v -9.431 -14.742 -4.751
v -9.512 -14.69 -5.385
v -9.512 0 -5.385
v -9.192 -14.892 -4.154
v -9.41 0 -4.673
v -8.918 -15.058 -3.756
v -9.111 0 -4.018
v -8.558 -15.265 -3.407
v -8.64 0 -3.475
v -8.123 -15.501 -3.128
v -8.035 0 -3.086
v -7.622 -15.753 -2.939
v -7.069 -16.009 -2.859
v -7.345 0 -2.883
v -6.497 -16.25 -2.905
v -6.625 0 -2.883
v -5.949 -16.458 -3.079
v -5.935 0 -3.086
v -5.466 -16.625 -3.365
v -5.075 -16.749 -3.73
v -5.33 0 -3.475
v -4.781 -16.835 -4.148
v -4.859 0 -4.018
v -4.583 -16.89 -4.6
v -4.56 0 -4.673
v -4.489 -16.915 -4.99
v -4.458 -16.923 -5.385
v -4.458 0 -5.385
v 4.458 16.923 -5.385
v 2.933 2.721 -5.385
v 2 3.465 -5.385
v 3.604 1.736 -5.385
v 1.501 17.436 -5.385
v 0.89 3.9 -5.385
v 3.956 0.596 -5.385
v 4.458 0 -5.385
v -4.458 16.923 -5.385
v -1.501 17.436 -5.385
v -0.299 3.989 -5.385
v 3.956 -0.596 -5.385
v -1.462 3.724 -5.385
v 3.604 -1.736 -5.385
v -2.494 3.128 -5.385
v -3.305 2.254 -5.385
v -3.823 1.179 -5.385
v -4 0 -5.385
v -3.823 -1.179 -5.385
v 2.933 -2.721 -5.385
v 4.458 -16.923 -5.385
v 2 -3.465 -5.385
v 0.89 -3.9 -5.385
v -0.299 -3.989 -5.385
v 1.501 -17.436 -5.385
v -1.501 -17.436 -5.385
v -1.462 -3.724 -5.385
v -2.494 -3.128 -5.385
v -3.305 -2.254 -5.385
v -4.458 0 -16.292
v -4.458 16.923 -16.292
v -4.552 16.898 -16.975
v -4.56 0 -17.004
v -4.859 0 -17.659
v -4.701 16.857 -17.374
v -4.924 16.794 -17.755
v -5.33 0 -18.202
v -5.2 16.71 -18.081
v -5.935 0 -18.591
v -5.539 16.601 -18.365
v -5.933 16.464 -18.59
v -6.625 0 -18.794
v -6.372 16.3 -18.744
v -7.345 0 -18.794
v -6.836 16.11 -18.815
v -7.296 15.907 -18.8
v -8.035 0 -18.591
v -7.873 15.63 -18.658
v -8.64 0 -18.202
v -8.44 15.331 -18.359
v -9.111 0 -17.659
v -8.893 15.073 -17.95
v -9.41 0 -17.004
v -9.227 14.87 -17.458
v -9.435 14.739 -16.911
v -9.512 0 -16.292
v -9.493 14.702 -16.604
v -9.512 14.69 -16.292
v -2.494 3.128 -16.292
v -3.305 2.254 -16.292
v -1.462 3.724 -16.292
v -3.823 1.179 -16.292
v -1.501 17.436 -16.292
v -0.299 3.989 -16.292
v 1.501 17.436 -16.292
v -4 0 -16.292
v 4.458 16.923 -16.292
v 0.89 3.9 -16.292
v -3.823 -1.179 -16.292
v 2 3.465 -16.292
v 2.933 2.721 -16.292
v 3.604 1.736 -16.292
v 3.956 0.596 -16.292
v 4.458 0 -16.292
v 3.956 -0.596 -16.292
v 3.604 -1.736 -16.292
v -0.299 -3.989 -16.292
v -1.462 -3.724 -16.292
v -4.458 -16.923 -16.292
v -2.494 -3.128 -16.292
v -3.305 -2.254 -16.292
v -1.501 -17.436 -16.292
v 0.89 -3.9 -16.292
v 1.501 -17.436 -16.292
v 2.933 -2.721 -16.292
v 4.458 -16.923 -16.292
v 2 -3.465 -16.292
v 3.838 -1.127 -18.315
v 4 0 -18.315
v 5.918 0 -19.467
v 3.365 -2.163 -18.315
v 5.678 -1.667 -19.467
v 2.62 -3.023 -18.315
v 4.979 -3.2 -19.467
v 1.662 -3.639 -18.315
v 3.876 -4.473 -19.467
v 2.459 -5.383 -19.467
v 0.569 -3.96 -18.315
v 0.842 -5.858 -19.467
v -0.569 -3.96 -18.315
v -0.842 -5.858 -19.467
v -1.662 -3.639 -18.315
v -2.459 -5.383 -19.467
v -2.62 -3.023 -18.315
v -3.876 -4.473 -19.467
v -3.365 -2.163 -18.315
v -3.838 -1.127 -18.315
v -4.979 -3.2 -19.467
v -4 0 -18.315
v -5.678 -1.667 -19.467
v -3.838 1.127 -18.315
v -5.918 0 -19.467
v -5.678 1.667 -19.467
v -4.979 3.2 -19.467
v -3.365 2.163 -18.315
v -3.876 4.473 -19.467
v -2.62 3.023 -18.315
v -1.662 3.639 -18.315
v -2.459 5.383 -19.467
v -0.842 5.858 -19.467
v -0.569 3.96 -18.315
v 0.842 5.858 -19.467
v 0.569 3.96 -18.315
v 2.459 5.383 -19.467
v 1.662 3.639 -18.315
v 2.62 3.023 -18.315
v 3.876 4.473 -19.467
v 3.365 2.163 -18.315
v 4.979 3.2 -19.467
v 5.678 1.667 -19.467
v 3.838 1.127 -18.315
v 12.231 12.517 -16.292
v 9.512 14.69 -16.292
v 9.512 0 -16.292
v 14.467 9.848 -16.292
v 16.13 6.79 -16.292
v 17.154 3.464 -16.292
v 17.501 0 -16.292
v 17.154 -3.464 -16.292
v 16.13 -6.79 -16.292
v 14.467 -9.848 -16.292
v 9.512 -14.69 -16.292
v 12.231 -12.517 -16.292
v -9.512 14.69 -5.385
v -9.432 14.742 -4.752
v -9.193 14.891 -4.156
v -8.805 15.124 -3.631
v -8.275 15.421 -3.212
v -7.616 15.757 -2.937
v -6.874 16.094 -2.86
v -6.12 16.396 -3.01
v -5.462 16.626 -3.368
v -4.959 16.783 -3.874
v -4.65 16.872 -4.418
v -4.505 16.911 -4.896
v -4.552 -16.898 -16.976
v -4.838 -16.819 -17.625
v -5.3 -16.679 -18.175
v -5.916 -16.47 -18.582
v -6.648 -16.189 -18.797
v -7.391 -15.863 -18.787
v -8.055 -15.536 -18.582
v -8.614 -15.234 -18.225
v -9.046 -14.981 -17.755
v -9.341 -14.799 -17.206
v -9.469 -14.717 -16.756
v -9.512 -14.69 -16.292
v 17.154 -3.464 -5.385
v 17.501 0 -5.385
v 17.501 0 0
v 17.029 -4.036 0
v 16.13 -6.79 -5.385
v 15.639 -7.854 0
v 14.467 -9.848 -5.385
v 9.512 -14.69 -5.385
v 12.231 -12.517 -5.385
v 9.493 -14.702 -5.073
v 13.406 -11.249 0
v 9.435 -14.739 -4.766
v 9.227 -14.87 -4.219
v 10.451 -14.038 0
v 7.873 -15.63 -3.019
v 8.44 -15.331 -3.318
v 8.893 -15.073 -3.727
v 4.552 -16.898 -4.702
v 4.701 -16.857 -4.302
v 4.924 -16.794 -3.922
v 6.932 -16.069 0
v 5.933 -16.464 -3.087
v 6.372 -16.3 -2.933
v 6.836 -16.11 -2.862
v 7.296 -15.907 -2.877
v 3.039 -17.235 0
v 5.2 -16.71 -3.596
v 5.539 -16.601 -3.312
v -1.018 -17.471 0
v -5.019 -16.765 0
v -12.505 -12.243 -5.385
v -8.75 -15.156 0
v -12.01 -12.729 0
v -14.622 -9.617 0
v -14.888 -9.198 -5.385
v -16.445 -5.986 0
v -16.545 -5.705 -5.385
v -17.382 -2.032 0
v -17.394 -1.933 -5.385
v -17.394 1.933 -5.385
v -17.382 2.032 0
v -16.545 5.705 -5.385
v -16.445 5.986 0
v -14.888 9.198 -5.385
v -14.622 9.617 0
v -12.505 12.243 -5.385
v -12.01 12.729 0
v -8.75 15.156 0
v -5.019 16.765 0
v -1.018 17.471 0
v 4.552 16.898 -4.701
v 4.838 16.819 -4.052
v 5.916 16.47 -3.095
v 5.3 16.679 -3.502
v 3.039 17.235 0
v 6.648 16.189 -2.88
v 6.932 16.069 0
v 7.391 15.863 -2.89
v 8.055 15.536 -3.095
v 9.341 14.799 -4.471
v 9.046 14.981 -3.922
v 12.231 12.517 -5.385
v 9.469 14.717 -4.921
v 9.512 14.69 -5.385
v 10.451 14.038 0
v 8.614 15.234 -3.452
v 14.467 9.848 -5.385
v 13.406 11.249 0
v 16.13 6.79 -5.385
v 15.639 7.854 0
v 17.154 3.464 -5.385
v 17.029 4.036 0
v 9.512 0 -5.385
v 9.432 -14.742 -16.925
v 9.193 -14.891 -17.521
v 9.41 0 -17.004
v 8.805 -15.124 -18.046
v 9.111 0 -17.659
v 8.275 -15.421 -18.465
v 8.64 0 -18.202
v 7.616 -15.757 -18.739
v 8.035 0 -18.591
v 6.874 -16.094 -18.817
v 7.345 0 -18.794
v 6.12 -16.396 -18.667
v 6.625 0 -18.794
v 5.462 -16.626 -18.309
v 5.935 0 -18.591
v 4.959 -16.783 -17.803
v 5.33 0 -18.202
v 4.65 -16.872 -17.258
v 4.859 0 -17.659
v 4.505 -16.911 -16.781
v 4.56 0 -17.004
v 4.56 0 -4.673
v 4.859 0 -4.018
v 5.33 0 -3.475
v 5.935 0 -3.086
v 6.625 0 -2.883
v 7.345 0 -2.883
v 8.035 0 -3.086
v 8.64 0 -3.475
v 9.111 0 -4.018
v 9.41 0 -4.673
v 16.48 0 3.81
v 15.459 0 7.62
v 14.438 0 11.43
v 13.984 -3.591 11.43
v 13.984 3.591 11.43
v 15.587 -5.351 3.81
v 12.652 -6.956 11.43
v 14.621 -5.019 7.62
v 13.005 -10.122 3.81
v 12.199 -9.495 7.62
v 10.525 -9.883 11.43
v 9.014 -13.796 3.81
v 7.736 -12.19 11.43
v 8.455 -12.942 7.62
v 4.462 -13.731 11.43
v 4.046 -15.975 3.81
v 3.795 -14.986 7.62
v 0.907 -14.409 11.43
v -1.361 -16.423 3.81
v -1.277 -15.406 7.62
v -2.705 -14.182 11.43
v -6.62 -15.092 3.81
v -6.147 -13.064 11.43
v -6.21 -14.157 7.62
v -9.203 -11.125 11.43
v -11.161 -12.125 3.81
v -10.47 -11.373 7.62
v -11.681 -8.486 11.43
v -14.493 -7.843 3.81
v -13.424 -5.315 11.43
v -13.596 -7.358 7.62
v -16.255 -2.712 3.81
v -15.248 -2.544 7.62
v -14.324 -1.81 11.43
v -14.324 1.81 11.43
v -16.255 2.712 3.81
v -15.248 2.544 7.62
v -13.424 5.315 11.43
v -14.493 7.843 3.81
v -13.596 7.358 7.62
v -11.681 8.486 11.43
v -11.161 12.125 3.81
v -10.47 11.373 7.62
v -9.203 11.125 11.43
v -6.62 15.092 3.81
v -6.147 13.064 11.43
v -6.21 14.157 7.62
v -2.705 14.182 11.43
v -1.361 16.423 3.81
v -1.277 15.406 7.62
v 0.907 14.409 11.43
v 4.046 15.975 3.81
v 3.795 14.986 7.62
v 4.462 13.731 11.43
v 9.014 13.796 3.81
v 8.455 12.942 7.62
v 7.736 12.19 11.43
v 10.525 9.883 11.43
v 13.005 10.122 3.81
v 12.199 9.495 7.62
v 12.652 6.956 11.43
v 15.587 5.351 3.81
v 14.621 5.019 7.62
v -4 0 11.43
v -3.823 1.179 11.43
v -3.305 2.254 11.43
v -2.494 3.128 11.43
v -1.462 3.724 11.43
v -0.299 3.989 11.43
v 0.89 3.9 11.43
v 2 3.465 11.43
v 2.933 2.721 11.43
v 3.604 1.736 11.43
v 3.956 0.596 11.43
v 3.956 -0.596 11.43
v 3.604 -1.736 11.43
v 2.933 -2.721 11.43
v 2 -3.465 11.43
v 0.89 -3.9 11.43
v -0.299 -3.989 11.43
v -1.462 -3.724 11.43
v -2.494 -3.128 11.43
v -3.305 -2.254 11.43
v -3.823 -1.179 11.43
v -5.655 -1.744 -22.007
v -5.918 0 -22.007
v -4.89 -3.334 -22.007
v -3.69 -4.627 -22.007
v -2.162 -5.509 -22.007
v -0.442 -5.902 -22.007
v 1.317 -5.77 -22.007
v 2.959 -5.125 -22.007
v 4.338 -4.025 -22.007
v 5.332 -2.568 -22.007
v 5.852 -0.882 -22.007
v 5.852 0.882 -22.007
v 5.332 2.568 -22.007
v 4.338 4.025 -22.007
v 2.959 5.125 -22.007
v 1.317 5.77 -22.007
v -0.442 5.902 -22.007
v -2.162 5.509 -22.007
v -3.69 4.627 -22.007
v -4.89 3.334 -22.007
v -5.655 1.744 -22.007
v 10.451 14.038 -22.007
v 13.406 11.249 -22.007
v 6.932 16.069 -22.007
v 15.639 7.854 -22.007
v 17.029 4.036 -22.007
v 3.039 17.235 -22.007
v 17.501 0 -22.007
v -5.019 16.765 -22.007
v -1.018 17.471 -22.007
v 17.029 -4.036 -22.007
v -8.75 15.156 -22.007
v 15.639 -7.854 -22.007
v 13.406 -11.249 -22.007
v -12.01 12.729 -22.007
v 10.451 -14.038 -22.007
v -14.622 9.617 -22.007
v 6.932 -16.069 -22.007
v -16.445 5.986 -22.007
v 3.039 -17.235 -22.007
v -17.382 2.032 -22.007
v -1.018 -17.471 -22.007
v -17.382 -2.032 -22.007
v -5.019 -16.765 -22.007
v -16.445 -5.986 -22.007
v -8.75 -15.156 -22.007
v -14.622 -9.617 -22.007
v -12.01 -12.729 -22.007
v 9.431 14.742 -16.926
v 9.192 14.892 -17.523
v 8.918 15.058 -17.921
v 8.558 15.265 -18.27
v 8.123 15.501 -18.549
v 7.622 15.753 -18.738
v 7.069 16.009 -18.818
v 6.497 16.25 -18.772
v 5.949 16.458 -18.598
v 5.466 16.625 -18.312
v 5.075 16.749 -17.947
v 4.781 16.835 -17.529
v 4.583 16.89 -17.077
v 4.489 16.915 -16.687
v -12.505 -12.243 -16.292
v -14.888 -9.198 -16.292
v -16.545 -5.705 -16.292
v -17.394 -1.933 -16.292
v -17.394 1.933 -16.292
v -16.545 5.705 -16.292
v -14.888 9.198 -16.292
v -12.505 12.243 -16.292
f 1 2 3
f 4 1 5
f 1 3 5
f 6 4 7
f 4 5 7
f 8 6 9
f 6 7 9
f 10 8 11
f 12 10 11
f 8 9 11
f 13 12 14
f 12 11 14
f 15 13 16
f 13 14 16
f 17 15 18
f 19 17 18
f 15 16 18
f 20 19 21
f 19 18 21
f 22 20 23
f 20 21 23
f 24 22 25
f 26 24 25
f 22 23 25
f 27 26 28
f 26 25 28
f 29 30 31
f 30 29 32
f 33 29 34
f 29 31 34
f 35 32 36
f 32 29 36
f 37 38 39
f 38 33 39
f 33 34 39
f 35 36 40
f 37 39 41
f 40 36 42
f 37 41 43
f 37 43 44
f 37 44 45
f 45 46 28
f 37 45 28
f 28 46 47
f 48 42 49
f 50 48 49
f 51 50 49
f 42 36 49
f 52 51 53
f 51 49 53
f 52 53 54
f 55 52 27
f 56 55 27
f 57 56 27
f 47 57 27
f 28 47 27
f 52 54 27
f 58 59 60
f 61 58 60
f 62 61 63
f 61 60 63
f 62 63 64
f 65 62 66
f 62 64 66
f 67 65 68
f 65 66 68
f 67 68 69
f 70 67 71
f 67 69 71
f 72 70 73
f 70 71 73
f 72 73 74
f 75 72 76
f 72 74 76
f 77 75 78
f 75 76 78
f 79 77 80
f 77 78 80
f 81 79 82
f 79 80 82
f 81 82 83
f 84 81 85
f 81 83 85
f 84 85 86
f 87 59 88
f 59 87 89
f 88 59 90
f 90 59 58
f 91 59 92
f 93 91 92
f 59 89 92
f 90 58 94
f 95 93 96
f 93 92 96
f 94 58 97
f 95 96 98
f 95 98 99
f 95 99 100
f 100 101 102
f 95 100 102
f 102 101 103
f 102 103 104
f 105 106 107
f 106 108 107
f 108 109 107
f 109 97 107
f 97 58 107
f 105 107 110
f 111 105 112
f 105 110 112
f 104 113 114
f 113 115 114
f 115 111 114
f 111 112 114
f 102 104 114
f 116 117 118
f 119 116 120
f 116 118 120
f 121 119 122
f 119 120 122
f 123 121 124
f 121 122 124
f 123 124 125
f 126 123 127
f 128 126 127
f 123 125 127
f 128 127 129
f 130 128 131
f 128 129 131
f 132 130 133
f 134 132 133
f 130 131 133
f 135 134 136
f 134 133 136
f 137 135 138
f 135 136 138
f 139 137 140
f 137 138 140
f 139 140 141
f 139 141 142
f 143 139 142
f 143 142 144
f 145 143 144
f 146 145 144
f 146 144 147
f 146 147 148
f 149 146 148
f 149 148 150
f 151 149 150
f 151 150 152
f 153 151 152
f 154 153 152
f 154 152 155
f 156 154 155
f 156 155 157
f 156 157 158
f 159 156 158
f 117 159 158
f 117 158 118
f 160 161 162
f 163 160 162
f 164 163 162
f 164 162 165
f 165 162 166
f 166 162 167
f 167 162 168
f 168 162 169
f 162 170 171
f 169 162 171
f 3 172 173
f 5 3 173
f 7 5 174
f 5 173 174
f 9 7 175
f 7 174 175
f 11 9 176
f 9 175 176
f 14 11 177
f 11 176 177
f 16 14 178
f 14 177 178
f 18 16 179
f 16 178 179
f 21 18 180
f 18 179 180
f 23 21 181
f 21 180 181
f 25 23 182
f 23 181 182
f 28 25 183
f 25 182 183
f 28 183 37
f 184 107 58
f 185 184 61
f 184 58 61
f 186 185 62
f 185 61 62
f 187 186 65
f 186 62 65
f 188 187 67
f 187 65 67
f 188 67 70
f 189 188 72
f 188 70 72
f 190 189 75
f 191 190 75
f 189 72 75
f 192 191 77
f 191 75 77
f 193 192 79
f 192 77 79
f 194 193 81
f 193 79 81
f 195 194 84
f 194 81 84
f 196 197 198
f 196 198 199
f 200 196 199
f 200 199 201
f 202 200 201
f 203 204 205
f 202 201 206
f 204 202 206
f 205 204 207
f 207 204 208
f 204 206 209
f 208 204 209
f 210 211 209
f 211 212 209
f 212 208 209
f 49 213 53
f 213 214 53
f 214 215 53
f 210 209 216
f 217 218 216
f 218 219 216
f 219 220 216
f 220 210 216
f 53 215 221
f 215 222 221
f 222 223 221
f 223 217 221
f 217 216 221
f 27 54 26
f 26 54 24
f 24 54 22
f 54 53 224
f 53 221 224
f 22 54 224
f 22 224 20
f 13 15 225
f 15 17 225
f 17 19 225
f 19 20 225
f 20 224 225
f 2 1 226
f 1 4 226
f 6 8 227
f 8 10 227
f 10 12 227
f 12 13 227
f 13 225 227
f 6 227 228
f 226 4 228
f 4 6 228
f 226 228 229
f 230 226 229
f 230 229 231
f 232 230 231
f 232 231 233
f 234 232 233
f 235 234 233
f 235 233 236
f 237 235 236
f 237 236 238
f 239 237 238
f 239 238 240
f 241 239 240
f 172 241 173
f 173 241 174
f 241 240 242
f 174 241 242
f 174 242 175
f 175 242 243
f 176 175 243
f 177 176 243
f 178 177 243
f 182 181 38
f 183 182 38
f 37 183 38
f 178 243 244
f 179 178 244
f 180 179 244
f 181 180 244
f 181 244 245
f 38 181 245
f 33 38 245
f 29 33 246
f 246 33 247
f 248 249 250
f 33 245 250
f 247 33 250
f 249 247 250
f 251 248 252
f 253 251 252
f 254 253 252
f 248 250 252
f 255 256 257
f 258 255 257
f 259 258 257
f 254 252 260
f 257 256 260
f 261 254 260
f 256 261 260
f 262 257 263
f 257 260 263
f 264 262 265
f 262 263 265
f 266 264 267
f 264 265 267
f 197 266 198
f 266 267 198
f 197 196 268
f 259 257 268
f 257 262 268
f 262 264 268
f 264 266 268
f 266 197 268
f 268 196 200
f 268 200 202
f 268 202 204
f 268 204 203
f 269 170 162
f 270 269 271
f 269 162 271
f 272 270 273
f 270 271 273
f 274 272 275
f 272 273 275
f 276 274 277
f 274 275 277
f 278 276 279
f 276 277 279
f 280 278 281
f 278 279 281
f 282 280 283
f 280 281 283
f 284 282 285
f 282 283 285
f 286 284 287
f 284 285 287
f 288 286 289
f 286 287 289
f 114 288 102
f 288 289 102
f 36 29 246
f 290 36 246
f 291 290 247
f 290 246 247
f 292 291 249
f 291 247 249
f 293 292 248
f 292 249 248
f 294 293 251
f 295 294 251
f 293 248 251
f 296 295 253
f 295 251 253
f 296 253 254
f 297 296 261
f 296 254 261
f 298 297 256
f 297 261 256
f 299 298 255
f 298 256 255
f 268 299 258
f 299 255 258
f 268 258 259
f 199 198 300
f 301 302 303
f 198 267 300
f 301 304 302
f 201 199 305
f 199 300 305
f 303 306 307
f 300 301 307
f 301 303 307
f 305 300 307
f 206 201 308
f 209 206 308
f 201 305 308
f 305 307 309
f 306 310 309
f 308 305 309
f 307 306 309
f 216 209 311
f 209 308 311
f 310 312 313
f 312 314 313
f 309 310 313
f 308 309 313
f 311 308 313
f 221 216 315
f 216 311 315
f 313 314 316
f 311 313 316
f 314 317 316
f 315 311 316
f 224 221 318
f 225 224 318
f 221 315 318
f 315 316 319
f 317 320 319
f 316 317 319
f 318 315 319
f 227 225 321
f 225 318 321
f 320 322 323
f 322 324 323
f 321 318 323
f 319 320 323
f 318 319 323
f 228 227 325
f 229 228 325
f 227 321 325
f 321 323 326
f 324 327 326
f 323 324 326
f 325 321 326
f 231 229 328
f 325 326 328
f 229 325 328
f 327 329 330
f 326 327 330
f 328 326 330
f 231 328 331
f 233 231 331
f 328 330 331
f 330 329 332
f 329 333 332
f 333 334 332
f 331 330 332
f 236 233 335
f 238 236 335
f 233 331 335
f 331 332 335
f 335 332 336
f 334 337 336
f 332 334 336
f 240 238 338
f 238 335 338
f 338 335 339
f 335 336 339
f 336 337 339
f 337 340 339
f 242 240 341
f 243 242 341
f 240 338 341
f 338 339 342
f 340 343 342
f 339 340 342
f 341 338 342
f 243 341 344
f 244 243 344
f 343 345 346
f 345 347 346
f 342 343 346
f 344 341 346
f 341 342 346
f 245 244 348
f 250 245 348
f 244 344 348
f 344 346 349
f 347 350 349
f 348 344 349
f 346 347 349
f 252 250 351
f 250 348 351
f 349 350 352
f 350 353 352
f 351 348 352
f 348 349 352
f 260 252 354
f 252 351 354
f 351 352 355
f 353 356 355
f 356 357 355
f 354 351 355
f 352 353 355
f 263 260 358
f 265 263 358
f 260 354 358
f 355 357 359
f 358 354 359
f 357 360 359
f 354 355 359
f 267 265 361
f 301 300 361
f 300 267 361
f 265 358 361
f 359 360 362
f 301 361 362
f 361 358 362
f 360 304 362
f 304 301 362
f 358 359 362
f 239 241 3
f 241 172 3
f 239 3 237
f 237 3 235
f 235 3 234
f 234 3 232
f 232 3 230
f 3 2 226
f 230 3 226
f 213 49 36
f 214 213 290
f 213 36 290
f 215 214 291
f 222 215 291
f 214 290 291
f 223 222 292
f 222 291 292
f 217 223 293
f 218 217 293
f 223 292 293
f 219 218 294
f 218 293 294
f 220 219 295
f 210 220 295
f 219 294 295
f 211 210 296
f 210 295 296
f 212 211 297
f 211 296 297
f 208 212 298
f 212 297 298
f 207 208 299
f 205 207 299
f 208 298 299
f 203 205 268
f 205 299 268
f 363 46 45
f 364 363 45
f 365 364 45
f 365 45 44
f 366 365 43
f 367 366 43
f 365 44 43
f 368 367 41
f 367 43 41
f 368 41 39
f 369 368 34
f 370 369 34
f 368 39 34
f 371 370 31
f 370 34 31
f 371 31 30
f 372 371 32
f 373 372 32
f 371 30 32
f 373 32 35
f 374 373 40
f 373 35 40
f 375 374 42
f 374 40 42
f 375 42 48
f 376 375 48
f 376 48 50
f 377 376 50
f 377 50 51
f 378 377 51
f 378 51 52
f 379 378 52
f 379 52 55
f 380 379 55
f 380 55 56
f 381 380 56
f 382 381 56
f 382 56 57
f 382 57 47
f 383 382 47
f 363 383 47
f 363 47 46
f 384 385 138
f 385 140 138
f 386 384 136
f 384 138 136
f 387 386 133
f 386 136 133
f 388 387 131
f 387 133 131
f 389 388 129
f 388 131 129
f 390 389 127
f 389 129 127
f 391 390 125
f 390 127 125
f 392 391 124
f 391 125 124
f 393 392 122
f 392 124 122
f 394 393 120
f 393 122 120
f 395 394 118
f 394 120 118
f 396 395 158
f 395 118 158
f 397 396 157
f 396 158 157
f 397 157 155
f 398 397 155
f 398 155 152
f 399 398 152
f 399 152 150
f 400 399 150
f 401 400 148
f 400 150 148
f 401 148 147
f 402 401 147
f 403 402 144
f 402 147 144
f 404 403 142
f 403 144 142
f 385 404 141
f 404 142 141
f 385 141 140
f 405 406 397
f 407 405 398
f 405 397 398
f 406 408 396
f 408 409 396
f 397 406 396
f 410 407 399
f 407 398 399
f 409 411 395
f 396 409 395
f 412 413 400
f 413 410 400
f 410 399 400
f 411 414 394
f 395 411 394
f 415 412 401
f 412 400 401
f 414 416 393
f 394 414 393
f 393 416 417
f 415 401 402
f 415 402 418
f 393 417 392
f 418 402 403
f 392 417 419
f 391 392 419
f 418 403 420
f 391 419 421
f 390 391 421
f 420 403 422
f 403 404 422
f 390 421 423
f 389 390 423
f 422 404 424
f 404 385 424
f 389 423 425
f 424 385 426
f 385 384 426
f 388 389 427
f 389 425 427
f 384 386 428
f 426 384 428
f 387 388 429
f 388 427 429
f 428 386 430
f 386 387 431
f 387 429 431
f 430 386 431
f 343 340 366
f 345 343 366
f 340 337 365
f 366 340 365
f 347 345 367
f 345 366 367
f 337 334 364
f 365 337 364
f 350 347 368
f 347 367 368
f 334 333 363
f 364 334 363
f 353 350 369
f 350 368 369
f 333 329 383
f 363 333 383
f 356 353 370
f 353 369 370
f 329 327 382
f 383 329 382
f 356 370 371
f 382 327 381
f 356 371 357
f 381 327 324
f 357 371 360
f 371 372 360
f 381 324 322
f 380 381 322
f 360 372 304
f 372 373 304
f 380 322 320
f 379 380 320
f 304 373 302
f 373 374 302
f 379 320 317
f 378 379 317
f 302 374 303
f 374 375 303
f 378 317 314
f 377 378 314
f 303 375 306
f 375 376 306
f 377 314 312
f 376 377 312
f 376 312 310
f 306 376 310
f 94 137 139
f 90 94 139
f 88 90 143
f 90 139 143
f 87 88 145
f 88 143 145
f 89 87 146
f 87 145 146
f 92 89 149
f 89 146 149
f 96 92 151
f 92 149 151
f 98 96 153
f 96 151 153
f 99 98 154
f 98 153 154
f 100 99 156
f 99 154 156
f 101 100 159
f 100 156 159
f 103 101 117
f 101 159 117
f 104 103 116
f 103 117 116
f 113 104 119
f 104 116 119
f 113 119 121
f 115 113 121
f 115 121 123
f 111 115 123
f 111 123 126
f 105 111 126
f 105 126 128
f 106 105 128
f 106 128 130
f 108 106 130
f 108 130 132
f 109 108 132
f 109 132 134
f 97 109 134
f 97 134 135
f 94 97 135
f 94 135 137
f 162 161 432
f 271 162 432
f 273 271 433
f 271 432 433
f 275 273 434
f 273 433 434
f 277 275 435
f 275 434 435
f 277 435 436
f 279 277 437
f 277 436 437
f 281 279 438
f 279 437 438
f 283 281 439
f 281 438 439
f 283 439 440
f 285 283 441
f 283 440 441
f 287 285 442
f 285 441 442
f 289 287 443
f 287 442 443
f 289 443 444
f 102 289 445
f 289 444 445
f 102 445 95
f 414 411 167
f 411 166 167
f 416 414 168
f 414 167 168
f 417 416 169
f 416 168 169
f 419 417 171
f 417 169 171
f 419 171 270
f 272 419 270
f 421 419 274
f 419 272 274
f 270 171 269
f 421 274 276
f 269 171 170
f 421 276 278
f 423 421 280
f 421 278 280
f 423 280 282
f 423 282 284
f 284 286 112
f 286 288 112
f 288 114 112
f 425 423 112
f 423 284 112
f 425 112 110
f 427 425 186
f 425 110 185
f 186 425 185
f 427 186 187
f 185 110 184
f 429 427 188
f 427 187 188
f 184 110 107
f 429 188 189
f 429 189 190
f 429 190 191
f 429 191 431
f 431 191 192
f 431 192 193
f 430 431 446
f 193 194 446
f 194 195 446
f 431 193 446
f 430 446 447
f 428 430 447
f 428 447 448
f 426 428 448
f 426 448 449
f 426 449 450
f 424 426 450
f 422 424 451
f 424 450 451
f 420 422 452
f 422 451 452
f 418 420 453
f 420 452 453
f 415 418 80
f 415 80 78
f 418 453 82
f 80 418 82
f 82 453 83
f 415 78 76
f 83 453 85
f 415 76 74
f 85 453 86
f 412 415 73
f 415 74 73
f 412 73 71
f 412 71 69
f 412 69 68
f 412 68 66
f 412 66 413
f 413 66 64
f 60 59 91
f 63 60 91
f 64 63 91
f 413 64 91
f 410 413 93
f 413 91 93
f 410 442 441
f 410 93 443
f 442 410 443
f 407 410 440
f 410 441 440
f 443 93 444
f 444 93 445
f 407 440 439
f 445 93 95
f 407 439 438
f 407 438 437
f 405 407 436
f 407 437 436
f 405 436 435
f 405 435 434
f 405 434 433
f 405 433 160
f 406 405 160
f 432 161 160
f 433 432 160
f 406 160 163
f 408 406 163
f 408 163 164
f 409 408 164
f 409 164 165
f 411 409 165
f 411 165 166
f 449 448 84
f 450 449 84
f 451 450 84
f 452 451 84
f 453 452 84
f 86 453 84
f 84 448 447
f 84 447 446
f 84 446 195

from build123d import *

# Parameters (mm, degrees)
F0_W       = 10.5156
F0_H       = 5.3848
F0_W_2     = 6.985
F0_H_2     = 5.715
F2_D       = 5.0546
F2_DEPTH   = 17.5016
F2_2_D     = 5.0546
F2_2_DEPTH = 17.5016
F3_D       = 5.0546
F3_2_D     = 5.0546
F5_D       = 8.001
F5_2_D     = 8.001
F7_D       = 11.8364
F7_DEPTH   = 2.54
F7_TIP     = 3.5560133155


with BuildPart() as f1:
    # F0 (on Front) → F1 (revolve)
    with BuildSketch(Plane.XZ):
        Polygon((0, 11.43), (0, 0), (6.985, 0), (17.5006, 0), (14.4379407305, 11.43), align=None)
        with Locations((12.2428, -2.6924)):
            Rectangle(F0_W, F0_H)
        with Locations((3.4925, -2.6924)):
            Rectangle(F0_W_2, F0_H)
    revolve(axis=Axis((0, 0, 5.715), (0, 0, -1)))

    # F2 (through all, one way)
    with BuildSketch(Plane(origin=(0, 0, 0), x_dir=(1, 0, 0), z_dir=(0, 1, 0))):
        with Locations((6.985, 5.3848), (-6.985, 5.3848), (6.985, 16.2921505755), (-6.985, 16.2921505755)):
            Circle(F2_D / 2)
    extrude(amount=-F2_DEPTH, mode=Mode.SUBTRACT)

    # F3 (through all)
    with Locations(Plane.XZ):
        with Locations((-6.985, -5.3848), (6.985, -5.3848), (6.985, -16.2921505755), (-6.985, -16.2921505755)):
            Hole(F3_D / 2)

    # F5 (through all)
    with Locations(Plane.XY.offset(11.43)):
        with Locations((0, 0)):
            Hole(F5_D / 2)


with BuildPart() as f1b:
    # F0 (on Front) → F1, piece 2 (revolve)
    with BuildSketch(Plane.XZ):
        with Locations((3.4925, -19.1496505755)):
            Rectangle(F0_W_2, F0_H_2)
        with Locations((12.2428, -19.1496505755)):
            Rectangle(F0_W, F0_H_2)
    revolve(axis=Axis((0, 0, 5.715), (0, 0, -1)))

    # F2#2 (through all, one way)
    with BuildSketch(Plane(origin=(0, 0, 0), x_dir=(1, 0, 0), z_dir=(0, 1, 0))):
        with Locations((6.985, 5.3848), (-6.985, 5.3848), (6.985, 16.2921505755), (-6.985, 16.2921505755)):
            Circle(F2_2_D / 2)
    extrude(amount=-F2_2_DEPTH, mode=Mode.SUBTRACT)

    # F3#2 (through all)
    with Locations(Plane.XZ):
        with Locations((-6.985, -5.3848), (6.985, -5.3848), (6.985, -16.2921505755), (-6.985, -16.2921505755)):
            Hole(F3_2_D / 2)

    # F5#2 (through all)
    with Locations(Plane.XY.offset(11.43)):
        with Locations((0, 0)):
            Hole(F5_2_D / 2)

    # F7
    with Locations(Plane(origin=(0, 0, -22.0071505755), x_dir=(1, 0, 0), z_dir=(0, 0, -1))):
        with Locations((0, 0)):
            Hole(F7_D / 2, depth=F7_DEPTH)
            with Locations((0, 0, -(F7_DEPTH + F7_TIP / 2))):  # 118° drill point
                Cone(0, F7_D / 2, F7_TIP, mode=Mode.SUBTRACT)


solid = Compound([f1.part, f1b.part])
